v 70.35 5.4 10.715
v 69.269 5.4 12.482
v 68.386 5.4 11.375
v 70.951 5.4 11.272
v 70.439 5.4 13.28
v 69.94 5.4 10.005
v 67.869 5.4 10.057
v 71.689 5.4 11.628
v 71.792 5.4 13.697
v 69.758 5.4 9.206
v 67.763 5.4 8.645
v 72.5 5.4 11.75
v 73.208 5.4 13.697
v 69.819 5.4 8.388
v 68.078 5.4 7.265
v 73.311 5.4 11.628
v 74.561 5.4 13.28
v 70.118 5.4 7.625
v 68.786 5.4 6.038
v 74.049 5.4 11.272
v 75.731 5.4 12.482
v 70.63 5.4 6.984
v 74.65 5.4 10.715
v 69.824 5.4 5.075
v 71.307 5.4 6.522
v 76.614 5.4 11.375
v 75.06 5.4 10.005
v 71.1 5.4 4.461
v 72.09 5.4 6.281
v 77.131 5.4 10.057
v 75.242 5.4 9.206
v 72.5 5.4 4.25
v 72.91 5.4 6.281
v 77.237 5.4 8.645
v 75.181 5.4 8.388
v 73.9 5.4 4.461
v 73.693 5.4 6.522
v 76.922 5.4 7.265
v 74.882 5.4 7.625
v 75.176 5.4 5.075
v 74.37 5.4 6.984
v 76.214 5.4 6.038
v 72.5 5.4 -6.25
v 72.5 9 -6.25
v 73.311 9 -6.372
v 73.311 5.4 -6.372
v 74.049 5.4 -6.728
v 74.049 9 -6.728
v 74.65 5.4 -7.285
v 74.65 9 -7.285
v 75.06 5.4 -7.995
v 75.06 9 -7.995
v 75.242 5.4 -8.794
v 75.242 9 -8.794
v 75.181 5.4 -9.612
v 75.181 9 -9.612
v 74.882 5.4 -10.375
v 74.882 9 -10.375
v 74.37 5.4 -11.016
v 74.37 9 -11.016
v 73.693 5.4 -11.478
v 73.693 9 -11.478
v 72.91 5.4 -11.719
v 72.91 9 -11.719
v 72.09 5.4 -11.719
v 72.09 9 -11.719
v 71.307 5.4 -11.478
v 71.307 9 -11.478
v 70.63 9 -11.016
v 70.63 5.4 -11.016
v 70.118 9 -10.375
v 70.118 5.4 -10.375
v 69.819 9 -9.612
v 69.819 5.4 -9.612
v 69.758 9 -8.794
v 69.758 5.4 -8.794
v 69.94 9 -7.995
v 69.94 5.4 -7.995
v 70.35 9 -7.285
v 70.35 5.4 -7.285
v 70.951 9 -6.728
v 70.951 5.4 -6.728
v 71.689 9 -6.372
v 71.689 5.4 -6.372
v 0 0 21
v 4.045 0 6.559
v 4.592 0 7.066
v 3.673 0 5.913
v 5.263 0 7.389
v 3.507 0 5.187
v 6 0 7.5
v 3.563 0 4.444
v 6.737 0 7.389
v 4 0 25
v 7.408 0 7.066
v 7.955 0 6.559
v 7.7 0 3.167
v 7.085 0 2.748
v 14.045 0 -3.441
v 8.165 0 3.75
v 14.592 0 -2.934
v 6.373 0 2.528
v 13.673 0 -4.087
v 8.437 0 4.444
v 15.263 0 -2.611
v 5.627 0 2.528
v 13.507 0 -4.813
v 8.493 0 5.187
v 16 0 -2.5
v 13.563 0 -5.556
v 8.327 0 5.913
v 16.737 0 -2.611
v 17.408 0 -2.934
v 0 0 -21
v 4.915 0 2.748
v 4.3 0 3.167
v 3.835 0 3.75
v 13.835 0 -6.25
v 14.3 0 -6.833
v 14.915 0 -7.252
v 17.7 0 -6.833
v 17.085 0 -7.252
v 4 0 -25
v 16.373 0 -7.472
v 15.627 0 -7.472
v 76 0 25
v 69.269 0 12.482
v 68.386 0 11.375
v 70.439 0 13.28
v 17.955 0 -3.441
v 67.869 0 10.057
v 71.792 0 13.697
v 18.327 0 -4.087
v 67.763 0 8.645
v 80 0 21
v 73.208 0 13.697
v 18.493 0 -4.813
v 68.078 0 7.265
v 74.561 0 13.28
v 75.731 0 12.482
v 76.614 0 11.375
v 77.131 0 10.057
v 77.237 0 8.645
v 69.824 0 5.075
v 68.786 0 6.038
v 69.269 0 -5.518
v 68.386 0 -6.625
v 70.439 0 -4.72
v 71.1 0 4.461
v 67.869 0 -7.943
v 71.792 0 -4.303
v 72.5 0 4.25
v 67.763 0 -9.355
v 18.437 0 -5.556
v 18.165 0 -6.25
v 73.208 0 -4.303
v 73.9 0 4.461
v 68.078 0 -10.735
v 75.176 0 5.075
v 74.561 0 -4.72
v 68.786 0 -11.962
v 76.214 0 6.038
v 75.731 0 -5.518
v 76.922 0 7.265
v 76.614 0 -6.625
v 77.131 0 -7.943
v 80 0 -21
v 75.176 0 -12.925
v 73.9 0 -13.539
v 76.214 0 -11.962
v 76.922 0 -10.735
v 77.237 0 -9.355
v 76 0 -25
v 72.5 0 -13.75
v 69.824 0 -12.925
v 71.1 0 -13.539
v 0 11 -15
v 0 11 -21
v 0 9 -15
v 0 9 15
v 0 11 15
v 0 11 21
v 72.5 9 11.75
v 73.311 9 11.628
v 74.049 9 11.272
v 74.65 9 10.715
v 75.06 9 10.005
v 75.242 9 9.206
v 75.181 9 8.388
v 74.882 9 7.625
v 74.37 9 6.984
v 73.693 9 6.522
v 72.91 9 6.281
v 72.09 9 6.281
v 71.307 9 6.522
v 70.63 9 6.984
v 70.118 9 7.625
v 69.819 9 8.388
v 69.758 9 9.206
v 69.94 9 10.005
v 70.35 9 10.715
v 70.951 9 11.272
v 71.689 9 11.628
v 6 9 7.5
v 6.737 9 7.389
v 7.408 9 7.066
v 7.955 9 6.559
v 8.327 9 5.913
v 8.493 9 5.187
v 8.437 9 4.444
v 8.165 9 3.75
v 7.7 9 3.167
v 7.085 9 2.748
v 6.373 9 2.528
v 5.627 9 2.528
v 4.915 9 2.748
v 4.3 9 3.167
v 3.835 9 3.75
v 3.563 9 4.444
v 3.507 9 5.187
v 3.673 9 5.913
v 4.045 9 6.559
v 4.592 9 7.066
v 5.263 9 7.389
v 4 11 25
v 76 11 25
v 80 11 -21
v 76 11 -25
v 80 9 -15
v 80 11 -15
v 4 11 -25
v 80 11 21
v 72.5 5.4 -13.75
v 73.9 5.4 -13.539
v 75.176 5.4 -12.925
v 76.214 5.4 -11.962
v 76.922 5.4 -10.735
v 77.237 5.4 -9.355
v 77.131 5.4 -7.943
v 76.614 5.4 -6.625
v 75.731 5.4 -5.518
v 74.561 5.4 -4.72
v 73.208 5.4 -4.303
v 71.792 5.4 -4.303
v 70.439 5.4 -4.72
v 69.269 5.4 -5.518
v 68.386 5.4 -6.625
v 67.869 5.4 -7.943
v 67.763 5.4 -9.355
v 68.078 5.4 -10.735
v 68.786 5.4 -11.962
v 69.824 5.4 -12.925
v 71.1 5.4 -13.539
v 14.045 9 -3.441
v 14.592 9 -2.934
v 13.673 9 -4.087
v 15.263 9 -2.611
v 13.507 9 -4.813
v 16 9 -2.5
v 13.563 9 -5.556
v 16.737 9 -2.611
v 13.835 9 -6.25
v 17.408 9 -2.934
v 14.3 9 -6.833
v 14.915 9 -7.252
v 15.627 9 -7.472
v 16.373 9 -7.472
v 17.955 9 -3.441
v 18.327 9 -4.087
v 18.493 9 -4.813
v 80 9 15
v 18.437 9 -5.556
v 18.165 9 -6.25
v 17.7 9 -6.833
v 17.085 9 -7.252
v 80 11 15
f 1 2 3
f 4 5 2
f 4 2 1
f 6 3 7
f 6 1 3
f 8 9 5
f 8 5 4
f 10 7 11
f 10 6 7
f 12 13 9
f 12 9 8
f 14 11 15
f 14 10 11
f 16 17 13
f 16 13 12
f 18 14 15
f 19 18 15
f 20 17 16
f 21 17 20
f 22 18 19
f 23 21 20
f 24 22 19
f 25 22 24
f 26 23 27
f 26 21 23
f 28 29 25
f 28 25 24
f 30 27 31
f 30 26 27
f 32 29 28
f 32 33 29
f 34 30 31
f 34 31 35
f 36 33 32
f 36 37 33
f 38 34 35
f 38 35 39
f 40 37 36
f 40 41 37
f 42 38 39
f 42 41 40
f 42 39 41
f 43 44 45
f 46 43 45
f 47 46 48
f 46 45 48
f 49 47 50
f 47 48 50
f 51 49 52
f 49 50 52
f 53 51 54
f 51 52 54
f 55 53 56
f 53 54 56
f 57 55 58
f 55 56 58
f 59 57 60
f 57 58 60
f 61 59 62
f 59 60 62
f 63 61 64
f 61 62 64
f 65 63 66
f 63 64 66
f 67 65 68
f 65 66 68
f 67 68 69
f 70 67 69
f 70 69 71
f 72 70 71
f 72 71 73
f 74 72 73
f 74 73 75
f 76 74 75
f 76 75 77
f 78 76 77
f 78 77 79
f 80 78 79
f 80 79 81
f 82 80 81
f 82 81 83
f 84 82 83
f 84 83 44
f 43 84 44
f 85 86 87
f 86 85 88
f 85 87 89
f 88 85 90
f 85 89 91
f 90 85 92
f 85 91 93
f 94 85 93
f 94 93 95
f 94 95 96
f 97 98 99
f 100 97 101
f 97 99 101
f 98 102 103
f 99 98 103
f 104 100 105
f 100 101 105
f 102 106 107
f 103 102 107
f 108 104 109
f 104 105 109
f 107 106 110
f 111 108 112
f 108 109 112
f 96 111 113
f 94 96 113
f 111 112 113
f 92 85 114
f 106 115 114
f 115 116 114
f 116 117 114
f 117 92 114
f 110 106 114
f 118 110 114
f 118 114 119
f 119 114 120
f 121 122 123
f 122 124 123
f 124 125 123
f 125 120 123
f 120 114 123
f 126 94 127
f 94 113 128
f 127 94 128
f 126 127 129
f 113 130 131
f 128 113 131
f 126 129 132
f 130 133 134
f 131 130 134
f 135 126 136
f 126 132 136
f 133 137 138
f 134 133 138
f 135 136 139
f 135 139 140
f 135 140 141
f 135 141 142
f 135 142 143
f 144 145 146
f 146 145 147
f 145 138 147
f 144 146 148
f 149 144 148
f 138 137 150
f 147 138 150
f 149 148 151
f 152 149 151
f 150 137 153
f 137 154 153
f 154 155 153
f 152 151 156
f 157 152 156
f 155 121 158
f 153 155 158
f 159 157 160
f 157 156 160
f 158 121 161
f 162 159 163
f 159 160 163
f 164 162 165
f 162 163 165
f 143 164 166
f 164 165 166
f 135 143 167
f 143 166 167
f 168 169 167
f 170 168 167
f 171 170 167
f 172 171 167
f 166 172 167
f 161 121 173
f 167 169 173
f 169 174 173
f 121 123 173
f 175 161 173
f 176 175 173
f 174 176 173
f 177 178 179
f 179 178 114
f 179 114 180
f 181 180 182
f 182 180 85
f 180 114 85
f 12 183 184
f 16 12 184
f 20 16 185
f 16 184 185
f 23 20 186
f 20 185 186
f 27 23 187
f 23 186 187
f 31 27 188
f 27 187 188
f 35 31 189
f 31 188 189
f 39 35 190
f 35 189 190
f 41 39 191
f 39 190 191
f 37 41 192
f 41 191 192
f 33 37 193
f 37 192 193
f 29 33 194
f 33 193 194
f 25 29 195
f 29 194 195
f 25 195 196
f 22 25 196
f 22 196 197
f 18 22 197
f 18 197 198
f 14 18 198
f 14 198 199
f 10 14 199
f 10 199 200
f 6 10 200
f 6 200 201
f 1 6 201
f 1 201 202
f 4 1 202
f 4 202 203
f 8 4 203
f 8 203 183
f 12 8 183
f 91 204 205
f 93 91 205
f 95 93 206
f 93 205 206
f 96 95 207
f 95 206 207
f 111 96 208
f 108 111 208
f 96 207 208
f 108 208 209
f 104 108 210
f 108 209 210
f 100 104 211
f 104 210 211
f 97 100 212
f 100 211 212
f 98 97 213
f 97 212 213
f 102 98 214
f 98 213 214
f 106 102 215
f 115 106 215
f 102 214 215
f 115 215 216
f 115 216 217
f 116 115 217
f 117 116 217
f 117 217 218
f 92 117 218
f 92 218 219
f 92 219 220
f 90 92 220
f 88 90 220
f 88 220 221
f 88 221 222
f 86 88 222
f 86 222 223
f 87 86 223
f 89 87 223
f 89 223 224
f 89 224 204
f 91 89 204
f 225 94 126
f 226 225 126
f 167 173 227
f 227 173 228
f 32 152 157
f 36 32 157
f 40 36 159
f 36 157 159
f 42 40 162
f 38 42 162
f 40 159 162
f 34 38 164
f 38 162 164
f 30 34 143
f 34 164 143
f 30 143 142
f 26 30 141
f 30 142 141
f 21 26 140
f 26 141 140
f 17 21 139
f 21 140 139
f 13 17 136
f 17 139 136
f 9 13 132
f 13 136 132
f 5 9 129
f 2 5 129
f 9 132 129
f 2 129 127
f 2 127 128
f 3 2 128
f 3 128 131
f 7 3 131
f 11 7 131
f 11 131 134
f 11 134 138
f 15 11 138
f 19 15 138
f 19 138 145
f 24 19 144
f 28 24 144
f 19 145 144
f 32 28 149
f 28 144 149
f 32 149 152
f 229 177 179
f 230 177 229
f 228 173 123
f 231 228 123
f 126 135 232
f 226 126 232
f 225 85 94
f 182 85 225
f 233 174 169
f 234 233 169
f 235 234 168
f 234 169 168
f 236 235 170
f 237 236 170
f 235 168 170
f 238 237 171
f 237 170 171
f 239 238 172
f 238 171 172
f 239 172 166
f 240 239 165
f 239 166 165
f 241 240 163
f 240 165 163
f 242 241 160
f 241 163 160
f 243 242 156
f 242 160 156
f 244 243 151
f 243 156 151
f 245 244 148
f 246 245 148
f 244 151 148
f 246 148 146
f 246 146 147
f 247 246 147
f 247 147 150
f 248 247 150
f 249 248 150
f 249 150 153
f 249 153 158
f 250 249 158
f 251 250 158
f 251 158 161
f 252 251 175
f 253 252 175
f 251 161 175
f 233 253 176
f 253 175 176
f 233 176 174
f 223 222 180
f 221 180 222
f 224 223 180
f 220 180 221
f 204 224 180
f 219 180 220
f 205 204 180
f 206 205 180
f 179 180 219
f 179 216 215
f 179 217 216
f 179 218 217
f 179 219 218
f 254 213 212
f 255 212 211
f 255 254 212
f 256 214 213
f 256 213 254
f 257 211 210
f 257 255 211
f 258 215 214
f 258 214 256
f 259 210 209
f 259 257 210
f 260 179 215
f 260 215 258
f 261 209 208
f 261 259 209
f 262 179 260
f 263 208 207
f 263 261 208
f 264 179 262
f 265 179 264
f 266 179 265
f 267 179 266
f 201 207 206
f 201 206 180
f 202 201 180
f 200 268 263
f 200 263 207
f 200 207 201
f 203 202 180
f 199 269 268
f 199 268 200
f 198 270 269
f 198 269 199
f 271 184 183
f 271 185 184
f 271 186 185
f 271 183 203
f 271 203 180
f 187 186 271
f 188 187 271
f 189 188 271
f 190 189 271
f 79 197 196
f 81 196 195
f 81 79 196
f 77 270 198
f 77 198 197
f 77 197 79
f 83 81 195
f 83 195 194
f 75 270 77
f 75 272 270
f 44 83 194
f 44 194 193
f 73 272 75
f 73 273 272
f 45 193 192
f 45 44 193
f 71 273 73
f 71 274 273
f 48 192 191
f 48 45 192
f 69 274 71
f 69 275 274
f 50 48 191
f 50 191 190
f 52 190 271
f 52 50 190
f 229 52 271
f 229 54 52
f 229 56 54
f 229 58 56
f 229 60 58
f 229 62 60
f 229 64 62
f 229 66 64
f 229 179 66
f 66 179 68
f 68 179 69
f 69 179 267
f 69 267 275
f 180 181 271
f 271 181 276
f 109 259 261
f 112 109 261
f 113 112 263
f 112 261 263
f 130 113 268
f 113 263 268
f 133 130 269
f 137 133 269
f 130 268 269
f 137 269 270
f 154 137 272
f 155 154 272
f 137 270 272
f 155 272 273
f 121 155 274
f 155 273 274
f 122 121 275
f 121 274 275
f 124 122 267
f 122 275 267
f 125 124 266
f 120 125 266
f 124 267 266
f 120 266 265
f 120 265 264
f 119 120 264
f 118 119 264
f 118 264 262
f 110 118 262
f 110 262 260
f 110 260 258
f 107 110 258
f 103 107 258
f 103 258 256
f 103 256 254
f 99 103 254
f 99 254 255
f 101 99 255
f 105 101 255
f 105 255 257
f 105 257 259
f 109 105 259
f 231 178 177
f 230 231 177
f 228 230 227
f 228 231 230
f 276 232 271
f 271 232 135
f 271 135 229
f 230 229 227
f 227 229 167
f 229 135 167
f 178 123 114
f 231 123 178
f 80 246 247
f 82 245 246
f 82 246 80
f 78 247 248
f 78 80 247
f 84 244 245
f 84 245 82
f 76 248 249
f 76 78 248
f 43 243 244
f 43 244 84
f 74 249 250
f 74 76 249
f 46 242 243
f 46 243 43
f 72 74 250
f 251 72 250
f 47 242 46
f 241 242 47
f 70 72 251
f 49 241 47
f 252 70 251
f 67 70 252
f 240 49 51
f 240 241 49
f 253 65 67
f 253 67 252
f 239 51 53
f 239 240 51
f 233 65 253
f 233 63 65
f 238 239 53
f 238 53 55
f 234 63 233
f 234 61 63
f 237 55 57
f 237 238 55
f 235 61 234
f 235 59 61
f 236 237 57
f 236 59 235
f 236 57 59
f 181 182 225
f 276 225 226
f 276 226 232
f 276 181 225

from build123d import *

# Parameters (mm, degrees)
RESSALTO_EXTRUS_O1_DEPTH = 11
ESBO_O2_W                = 80
ESBO_O2_H                = 30
CORTE_EXTRUS_O1_DEPTH    = 2
ESBO_O4_R                = 2.5
CORTE_EXTRUS_O2_DEPTH    = 85.297093663
ESBO_O5_R                = 2.75
CORTE_EXTRUS_O3_DEPTH    = 85.297093663
CHANFRO2_SIZE            = 4
ESBO_O7_R                = 4.75
CORTE_EXTRUS_O6_DEPTH    = 5.4


with BuildPart() as part:
    # Esboço1 → Ressalto-extrusão1 (new body)
    with BuildSketch(Plane(origin=(0, 0, 0), x_dir=(1, 0, 0), z_dir=(0, 1, 0))):
        Polygon((0, 0), (0, -25), (80, -25), (80, 25), (0, 25), align=None)
    extrude(amount=RESSALTO_EXTRUS_O1_DEPTH)

    # Esboço2 → Corte-extrusão1 (cut)
    with BuildSketch(Plane(origin=(0, 11, 0), x_dir=(1, 0, 0), z_dir=(0, 1, 0))):
        with Locations((40, 0)):
            Rectangle(ESBO_O2_W, ESBO_O2_H)
    extrude(amount=-CORTE_EXTRUS_O1_DEPTH, mode=Mode.SUBTRACT)

    # Esboço4 → Corte-extrusão2 (cut, through all)
    with BuildSketch(Plane(origin=(0, 9, 0), x_dir=(1, 0, 0), z_dir=(0, 1, 0))):
        with Locations(Location((16, 5, 0), (0, 0, 270))):
            Circle(ESBO_O4_R)
        with Locations(Location((6, -5, 0), (0, 0, 270))):
            Circle(ESBO_O4_R)
    extrude(amount=-CORTE_EXTRUS_O2_DEPTH, mode=Mode.SUBTRACT)

    # Esboço5 → Corte-extrusão3 (cut, through all)
    with BuildSketch(Plane(origin=(0, 9, 0), x_dir=(1, 0, 0), z_dir=(0, 1, 0))):
        with Locations(Location((72.5, 9, 0), (0, 0, 270))):
            Circle(ESBO_O5_R)
        with Locations(Location((72.5, -9, 0), (0, 0, 270))):
            Circle(ESBO_O5_R)
    extrude(amount=-CORTE_EXTRUS_O3_DEPTH, mode=Mode.SUBTRACT)

    # Chanfro2
    chanfro2_edges = [part.edges().sort_by_distance(p)[0] for p in [
        (0, 5.5, -25),
        (80, 5.5, -25),
        (80, 5.5, 25),
        (0, 5.5, 25),
    ]]
    chamfer(chanfro2_edges, length=CHANFRO2_SIZE)

    # Esboço7 → Corte-extrusão6 (cut)
    with BuildSketch(Plane.XZ):
        with Locations(Location((72.5, 9, 0), (0, 0, 270))):
            Circle(ESBO_O7_R)
        with Locations(Location((72.5, -9, 0), (0, 0, 270))):
            Circle(ESBO_O7_R)
    extrude(amount=-CORTE_EXTRUS_O6_DEPTH, mode=Mode.SUBTRACT)


solid = part.part
